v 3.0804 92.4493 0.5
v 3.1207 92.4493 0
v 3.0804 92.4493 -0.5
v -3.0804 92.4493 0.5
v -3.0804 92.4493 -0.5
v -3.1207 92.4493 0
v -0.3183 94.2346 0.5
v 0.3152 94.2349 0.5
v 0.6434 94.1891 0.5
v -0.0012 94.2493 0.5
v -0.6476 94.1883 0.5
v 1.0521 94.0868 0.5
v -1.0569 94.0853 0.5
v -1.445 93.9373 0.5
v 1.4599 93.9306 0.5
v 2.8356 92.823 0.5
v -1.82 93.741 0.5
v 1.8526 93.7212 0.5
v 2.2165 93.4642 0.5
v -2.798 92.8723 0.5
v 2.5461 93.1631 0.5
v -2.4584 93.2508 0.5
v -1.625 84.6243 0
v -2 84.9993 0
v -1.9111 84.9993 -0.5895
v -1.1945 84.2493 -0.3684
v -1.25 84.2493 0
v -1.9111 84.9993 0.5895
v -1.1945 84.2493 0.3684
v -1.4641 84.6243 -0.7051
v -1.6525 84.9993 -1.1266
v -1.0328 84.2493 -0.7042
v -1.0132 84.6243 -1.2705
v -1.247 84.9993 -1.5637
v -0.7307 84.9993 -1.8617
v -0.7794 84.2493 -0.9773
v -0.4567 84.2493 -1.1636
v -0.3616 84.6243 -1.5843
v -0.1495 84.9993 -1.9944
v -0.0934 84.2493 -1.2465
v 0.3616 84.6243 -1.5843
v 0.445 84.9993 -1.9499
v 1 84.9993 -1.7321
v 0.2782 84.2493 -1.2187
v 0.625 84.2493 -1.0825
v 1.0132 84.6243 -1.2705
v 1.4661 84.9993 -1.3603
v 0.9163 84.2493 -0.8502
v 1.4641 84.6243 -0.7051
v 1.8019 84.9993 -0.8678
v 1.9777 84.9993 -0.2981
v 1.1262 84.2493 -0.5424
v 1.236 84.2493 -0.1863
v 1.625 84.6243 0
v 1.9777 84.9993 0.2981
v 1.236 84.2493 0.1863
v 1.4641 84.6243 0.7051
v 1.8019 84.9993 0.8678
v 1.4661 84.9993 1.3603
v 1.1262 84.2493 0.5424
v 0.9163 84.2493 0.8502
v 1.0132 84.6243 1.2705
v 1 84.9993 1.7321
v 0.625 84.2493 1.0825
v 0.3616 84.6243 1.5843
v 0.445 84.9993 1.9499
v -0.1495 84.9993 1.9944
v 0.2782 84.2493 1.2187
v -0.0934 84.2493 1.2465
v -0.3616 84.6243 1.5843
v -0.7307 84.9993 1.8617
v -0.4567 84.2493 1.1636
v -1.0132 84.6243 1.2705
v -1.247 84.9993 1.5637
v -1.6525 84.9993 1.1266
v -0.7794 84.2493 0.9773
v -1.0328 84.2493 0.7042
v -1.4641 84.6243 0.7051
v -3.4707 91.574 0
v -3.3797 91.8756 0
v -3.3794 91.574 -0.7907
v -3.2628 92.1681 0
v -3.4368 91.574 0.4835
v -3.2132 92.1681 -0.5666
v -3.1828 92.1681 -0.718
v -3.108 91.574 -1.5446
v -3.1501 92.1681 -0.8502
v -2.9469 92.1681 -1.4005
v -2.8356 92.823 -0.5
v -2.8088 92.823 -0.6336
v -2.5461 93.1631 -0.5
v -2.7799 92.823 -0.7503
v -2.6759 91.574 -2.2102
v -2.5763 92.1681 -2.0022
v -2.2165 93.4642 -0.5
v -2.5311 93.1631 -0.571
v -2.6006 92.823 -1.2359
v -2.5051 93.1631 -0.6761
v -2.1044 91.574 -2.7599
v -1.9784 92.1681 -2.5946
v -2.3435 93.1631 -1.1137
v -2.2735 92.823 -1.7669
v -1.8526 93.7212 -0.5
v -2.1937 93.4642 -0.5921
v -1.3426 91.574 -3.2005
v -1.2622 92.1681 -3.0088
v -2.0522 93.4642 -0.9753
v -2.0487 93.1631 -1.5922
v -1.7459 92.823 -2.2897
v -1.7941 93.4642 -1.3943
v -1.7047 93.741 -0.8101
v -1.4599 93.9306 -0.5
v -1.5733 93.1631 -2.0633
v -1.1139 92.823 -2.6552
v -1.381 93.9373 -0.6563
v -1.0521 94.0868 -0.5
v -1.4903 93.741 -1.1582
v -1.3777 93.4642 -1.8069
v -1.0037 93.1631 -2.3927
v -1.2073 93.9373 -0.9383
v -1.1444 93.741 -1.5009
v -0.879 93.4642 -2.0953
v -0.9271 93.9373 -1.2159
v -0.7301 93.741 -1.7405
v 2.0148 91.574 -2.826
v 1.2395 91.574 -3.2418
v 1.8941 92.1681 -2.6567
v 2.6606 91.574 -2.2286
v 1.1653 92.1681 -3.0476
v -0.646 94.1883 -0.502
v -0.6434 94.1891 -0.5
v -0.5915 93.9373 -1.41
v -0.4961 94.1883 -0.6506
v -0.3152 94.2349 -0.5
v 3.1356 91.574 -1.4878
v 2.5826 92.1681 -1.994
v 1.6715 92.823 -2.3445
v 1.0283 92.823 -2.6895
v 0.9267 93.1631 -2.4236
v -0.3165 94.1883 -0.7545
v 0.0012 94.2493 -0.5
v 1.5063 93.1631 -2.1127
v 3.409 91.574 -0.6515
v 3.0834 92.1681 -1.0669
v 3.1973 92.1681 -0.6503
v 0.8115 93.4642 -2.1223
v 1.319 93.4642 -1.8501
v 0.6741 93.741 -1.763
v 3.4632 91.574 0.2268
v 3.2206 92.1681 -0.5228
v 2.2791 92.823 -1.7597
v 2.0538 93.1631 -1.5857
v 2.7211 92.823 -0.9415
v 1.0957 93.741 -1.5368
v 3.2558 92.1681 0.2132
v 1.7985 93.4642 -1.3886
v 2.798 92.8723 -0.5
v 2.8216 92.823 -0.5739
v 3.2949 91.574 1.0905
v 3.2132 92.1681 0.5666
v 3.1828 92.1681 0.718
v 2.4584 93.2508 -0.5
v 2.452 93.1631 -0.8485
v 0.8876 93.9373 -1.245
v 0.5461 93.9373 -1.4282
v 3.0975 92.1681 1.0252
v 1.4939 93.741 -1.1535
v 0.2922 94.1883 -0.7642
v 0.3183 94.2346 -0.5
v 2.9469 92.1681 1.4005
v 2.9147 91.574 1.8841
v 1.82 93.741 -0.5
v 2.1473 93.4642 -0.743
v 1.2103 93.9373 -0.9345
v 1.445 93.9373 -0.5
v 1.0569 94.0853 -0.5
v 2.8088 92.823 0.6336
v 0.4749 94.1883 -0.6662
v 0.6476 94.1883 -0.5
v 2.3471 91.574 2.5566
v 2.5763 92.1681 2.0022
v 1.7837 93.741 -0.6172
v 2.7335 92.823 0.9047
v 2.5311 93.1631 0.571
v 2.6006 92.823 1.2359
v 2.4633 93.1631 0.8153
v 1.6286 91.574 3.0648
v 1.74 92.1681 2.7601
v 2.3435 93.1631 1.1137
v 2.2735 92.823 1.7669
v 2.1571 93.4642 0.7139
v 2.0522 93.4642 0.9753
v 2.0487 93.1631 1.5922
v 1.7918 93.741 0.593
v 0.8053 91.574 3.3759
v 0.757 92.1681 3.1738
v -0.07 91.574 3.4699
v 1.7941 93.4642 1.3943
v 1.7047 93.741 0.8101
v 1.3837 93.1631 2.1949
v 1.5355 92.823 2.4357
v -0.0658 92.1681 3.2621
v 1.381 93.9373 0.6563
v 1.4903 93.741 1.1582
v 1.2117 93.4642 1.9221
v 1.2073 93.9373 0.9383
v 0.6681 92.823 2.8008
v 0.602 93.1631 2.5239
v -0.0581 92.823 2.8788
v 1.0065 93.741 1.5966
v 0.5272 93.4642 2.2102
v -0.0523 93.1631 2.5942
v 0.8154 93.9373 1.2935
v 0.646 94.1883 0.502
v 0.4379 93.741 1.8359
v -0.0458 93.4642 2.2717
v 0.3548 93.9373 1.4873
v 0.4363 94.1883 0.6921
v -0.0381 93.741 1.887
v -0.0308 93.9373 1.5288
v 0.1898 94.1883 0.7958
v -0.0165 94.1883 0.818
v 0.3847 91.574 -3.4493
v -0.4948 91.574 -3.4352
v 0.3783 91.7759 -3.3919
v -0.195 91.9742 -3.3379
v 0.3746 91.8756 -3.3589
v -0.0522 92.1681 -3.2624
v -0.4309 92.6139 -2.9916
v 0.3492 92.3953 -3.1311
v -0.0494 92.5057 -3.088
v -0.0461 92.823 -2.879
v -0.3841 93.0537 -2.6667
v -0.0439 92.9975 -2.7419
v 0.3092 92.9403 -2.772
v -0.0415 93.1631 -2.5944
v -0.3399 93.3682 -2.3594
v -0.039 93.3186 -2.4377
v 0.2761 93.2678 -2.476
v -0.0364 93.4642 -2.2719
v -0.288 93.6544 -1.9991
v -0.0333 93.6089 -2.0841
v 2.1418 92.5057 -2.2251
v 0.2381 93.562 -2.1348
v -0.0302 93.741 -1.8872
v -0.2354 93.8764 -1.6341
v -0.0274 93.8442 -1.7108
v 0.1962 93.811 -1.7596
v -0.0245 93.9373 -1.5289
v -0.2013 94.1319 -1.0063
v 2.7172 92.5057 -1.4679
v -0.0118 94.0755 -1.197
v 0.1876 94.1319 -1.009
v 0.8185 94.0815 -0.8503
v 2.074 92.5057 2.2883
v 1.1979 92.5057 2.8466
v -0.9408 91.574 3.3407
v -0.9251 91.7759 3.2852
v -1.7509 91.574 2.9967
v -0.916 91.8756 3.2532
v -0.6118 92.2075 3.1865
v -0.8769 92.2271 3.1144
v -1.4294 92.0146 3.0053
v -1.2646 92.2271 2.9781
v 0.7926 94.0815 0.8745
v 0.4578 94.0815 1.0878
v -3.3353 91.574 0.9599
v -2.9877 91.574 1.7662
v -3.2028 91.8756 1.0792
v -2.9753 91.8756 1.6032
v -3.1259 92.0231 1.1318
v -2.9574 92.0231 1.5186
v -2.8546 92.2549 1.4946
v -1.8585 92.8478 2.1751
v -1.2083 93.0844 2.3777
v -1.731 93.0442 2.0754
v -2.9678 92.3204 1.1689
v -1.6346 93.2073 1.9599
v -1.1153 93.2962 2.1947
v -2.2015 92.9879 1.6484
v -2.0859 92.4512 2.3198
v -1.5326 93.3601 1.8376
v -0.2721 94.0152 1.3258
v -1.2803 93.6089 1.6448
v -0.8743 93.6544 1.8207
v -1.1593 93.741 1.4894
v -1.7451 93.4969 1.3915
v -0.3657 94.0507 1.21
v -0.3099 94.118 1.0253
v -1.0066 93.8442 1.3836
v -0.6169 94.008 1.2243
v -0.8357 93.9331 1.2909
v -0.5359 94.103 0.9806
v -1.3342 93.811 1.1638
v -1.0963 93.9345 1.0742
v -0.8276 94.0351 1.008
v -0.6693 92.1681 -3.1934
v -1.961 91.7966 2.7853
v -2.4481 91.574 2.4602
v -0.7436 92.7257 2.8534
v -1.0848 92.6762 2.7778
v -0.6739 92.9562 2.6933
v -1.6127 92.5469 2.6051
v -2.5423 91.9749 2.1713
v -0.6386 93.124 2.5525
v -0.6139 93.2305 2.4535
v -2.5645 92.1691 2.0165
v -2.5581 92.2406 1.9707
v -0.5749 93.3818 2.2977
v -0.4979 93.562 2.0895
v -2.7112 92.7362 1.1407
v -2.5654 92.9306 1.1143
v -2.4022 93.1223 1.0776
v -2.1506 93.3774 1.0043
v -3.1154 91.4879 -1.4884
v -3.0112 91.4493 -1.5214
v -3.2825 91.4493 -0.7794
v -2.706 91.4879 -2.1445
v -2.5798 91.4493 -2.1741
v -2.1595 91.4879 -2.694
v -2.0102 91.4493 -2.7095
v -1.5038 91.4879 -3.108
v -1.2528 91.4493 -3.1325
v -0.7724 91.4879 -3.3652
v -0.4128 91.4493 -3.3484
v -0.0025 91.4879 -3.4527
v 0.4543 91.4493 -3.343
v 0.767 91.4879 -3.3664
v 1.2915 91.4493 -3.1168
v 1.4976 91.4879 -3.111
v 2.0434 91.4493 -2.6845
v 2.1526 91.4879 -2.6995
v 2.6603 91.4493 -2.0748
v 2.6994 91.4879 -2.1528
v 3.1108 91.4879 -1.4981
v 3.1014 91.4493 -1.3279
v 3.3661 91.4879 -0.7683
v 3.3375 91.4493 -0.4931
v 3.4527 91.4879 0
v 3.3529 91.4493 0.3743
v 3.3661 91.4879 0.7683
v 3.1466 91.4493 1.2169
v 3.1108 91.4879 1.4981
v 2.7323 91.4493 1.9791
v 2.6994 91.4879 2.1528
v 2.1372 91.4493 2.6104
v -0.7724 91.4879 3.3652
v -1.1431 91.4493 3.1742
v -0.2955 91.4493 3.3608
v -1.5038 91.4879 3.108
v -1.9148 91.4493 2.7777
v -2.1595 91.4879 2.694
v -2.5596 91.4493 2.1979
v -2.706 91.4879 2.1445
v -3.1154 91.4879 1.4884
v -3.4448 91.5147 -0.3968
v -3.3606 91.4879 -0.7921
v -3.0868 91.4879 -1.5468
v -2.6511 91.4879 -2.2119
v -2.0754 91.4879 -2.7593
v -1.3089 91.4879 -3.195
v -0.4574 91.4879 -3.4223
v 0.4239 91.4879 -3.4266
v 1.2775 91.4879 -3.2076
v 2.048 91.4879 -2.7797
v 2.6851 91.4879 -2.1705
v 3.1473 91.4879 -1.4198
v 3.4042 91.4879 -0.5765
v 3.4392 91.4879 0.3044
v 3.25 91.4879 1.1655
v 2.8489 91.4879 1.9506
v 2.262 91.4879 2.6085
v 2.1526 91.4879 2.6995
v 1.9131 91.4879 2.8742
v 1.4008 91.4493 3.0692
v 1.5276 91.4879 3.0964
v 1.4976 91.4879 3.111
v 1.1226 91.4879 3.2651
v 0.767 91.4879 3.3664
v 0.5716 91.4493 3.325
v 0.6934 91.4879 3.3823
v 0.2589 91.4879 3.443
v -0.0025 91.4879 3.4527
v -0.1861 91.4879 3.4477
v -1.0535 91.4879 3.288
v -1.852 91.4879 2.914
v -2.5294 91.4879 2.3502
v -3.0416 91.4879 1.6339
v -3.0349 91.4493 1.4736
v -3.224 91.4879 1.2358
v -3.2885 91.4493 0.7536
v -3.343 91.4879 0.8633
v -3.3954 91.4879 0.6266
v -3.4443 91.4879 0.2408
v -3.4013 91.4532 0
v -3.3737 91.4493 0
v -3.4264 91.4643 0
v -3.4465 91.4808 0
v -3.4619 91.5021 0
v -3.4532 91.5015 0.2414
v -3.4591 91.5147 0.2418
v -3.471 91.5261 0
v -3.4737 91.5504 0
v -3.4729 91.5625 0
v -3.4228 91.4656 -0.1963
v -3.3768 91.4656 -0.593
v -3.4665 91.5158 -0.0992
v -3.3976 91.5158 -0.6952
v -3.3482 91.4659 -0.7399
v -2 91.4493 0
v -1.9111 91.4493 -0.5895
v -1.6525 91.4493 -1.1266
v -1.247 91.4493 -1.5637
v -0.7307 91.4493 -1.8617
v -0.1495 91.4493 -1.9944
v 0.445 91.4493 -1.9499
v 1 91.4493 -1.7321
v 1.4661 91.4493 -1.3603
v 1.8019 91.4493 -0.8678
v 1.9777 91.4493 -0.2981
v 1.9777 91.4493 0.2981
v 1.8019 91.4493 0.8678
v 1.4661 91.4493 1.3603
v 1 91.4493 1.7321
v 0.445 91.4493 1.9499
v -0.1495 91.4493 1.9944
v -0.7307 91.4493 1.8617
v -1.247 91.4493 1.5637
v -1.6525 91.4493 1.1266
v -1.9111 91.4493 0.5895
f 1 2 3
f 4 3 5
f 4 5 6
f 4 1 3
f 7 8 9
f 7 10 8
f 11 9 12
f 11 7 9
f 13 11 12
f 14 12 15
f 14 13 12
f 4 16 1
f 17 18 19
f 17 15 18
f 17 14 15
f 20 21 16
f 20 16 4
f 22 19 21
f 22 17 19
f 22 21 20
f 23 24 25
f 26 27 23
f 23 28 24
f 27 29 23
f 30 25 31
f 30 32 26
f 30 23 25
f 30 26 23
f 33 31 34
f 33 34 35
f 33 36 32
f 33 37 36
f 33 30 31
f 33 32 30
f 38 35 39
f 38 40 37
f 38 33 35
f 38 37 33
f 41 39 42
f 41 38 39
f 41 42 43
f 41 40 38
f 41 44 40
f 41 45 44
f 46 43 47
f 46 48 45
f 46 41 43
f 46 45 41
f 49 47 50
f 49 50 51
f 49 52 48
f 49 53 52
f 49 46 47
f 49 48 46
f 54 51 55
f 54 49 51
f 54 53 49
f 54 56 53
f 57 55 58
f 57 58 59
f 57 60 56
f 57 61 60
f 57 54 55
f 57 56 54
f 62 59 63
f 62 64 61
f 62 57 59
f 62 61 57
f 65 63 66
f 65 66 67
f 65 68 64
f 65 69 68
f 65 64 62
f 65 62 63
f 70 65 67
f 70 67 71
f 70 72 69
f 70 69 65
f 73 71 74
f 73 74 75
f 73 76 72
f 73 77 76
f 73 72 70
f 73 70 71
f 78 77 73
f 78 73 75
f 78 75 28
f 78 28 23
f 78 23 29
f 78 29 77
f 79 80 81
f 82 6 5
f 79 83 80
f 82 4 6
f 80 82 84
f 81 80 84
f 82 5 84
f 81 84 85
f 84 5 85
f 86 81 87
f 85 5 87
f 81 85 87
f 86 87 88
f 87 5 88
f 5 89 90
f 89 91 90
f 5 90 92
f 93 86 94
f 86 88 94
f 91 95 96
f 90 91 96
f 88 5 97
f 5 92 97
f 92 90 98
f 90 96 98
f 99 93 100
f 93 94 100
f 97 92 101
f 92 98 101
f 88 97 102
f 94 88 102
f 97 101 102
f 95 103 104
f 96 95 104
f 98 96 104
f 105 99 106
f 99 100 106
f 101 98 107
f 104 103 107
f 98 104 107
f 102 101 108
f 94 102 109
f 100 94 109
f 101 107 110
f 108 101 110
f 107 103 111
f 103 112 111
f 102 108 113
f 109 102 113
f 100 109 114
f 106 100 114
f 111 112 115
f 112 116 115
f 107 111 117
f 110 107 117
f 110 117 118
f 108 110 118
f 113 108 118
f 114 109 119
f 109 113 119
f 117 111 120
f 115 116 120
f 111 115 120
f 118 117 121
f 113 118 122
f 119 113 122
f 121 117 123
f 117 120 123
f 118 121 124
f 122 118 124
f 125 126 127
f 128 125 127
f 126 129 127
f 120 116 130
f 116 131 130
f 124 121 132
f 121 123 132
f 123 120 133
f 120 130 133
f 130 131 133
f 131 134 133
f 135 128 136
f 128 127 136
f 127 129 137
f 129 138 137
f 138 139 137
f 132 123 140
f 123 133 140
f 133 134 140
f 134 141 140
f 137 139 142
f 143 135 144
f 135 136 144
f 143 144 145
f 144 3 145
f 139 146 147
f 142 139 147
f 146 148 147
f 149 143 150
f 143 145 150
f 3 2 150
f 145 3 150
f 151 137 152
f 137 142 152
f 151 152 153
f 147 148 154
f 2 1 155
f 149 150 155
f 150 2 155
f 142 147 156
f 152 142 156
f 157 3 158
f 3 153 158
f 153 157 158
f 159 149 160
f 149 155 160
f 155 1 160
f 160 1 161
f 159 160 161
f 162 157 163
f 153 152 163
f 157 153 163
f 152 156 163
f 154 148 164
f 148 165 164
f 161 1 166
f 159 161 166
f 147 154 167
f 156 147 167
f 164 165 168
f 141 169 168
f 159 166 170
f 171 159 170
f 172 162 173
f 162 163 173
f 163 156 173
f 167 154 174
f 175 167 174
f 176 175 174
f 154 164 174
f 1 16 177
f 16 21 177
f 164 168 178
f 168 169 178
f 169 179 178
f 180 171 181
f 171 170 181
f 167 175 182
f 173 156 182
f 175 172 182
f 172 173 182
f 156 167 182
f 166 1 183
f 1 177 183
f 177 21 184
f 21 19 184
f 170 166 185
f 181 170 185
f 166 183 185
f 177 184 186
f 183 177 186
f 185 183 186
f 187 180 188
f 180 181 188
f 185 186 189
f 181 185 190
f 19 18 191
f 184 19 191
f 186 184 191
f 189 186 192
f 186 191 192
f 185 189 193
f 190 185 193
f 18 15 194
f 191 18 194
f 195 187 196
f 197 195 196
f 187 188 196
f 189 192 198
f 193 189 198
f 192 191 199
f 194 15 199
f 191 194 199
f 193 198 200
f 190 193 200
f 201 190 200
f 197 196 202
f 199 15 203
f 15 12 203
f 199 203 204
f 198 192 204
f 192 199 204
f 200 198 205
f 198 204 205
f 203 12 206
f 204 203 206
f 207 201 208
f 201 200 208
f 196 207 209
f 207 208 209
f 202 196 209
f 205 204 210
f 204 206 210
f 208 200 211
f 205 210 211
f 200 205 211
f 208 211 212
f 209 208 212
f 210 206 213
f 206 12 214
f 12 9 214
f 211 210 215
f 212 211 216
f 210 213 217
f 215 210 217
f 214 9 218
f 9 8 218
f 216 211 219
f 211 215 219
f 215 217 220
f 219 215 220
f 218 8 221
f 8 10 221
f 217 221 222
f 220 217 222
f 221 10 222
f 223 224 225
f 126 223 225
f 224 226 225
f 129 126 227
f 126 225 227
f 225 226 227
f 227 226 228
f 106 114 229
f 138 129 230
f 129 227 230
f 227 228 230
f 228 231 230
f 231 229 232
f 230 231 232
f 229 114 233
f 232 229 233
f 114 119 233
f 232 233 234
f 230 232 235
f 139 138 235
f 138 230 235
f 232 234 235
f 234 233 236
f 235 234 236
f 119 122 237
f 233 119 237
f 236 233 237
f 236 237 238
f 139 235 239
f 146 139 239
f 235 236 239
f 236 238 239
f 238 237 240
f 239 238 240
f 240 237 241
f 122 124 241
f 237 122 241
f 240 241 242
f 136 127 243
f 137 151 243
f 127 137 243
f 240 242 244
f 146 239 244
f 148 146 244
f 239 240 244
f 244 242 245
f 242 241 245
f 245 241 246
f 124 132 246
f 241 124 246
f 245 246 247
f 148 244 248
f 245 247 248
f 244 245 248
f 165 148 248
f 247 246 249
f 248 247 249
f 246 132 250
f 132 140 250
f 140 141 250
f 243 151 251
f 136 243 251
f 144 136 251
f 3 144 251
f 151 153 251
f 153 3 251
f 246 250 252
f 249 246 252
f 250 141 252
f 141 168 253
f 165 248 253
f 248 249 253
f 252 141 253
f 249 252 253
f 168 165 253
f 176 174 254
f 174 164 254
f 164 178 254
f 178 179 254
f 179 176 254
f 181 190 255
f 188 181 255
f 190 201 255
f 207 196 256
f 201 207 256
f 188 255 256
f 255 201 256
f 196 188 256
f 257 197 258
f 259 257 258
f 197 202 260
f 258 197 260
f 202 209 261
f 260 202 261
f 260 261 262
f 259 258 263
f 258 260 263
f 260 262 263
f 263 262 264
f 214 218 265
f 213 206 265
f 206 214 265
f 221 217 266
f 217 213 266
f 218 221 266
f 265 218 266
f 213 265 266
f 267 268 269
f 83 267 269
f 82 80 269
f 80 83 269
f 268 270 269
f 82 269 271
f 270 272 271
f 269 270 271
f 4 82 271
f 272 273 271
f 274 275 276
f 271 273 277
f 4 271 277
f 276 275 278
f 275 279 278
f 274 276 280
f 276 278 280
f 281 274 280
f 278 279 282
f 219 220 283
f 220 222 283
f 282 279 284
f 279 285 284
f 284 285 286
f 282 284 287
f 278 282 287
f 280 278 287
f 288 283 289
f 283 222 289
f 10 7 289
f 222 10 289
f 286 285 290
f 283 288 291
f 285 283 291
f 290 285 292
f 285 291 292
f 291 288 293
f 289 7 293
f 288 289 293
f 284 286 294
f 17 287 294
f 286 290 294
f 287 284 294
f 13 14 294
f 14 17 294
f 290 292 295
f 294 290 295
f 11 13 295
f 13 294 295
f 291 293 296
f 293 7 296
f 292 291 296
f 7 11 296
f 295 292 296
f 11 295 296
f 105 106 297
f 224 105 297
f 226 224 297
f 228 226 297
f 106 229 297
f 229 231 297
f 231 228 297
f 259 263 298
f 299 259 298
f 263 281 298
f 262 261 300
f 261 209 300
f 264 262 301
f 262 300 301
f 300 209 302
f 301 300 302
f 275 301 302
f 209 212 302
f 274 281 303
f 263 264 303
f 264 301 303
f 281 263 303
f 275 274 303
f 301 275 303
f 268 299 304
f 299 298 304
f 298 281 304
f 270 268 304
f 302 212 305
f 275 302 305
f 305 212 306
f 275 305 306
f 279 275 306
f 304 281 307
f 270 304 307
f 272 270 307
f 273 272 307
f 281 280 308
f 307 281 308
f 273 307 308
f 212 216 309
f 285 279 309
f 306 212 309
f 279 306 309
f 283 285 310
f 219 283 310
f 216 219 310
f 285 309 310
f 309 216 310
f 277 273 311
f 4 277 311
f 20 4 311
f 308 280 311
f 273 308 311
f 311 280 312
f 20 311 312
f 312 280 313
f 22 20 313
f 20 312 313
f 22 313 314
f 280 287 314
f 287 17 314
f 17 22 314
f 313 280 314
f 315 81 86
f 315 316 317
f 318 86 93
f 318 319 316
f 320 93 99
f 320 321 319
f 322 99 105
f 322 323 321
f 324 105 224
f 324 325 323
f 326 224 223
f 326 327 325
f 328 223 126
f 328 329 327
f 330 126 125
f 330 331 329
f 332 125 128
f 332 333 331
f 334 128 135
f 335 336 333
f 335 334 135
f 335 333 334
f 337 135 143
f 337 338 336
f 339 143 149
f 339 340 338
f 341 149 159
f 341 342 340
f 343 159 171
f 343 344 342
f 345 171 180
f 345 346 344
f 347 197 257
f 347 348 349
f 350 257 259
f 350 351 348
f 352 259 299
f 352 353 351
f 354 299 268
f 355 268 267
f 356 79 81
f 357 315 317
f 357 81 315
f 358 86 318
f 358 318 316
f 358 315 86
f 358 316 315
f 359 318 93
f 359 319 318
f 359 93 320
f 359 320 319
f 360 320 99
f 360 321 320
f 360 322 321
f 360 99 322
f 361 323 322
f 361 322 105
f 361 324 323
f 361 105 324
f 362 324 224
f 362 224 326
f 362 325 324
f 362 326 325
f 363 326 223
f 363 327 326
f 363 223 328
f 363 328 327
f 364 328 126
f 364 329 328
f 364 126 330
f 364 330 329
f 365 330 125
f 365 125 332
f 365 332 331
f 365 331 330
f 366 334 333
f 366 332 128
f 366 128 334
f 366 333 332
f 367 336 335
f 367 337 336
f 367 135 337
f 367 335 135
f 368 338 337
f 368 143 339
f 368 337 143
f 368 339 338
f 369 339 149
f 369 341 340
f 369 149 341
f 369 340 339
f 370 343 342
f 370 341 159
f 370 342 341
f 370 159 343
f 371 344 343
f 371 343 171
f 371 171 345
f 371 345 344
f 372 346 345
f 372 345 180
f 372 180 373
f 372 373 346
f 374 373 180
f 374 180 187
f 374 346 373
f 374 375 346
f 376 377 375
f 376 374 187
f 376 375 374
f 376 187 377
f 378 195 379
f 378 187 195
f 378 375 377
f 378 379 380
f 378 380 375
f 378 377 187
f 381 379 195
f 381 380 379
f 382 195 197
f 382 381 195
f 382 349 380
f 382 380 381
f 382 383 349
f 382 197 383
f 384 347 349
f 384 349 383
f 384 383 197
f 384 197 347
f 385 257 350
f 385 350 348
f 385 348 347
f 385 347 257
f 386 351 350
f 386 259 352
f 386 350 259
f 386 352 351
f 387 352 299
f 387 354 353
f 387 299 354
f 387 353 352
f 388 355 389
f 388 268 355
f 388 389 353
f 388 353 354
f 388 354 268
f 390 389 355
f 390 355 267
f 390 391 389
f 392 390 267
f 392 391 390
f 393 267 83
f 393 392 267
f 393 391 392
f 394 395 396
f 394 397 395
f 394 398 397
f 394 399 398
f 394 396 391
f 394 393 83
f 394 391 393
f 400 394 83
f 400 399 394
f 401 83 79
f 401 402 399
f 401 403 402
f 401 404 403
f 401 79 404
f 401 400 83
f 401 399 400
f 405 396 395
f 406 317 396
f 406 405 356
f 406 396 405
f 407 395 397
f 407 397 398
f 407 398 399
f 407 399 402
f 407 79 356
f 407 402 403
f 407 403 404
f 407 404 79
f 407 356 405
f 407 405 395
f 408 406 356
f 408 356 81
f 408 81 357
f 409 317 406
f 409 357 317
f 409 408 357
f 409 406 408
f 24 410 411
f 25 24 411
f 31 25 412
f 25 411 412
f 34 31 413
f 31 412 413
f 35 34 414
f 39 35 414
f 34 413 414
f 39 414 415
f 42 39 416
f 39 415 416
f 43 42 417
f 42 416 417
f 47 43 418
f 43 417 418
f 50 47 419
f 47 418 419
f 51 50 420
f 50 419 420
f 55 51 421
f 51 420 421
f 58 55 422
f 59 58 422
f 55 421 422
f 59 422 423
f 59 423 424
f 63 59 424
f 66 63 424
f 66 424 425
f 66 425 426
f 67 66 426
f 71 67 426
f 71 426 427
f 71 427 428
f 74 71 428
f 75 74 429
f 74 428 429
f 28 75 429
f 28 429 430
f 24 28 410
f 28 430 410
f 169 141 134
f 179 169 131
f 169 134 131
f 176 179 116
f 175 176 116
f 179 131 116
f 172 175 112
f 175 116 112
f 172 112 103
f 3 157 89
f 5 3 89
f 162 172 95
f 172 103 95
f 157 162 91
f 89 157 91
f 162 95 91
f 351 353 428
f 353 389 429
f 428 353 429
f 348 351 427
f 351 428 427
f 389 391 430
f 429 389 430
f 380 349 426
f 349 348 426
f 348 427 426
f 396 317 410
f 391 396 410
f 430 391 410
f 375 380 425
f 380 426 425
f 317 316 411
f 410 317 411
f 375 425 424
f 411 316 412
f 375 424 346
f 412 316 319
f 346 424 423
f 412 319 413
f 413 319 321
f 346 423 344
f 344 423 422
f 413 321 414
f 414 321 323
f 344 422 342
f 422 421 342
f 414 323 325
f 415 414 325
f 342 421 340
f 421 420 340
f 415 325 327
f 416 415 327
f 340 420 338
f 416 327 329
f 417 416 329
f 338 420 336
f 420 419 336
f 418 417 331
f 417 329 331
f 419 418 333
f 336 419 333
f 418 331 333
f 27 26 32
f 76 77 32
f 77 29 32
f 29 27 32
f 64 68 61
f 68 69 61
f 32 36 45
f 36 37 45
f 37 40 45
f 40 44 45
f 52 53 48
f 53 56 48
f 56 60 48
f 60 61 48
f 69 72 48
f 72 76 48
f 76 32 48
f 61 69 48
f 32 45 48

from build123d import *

# Parameters (mm, degrees)
SKETCH_13_W         = 7
SKETCH_13_H         = 1
CUT_EXTRUDE_9_DEPTH = 1.8
FILLET_1_R          = 0.1
CHAMFER_1_SIZE      = 0.75


with BuildPart() as part:
    # Эскиз1 → Повернуть1 (revolve)
    with BuildSketch(Plane.XY):
        with BuildLine():
            Line((2, 91.44931314), (3.5, 91.44931314))
            ThreePointArc((3.5, 91.44931314), (2.438021098, 93.318621459), (0.5, 94.24931314))
            Line((0.5, 94.24931314), (0, 94.24931314))
            Line((0, 94.24931314), (0, 84.24931314))
            Line((0, 84.24931314), (2, 84.24931314))
            Line((2, 84.24931314), (2, 91.44931314))
        make_face()
    revolve(axis=Axis((0, 125.763182898, 0), (0, -1, 0)))

    # Эскиз13 → Вырез-Вытянуть9 (cut)
    with BuildSketch(Plane(origin=(0, 94.24931314, 0), x_dir=(-1, 0, 0), z_dir=(0, 1, 0))):
        Rectangle(SKETCH_13_W, SKETCH_13_H)
    extrude(amount=-CUT_EXTRUDE_9_DEPTH, mode=Mode.SUBTRACT)

    # Скругление1
    fillet_1_edges = [part.edges().sort_by_distance(p)[0] for p in [
        (-3.5, 91.44931314, 0),
    ]]
    fillet(fillet_1_edges, radius=FILLET_1_R)

    # Фаска1
    chamfer_1_edges = [part.edges().sort_by_distance(p)[0] for p in [
        (-2, 84.24931314, 0),
    ]]
    chamfer(chamfer_1_edges, length=CHAMFER_1_SIZE)


solid = part.part
